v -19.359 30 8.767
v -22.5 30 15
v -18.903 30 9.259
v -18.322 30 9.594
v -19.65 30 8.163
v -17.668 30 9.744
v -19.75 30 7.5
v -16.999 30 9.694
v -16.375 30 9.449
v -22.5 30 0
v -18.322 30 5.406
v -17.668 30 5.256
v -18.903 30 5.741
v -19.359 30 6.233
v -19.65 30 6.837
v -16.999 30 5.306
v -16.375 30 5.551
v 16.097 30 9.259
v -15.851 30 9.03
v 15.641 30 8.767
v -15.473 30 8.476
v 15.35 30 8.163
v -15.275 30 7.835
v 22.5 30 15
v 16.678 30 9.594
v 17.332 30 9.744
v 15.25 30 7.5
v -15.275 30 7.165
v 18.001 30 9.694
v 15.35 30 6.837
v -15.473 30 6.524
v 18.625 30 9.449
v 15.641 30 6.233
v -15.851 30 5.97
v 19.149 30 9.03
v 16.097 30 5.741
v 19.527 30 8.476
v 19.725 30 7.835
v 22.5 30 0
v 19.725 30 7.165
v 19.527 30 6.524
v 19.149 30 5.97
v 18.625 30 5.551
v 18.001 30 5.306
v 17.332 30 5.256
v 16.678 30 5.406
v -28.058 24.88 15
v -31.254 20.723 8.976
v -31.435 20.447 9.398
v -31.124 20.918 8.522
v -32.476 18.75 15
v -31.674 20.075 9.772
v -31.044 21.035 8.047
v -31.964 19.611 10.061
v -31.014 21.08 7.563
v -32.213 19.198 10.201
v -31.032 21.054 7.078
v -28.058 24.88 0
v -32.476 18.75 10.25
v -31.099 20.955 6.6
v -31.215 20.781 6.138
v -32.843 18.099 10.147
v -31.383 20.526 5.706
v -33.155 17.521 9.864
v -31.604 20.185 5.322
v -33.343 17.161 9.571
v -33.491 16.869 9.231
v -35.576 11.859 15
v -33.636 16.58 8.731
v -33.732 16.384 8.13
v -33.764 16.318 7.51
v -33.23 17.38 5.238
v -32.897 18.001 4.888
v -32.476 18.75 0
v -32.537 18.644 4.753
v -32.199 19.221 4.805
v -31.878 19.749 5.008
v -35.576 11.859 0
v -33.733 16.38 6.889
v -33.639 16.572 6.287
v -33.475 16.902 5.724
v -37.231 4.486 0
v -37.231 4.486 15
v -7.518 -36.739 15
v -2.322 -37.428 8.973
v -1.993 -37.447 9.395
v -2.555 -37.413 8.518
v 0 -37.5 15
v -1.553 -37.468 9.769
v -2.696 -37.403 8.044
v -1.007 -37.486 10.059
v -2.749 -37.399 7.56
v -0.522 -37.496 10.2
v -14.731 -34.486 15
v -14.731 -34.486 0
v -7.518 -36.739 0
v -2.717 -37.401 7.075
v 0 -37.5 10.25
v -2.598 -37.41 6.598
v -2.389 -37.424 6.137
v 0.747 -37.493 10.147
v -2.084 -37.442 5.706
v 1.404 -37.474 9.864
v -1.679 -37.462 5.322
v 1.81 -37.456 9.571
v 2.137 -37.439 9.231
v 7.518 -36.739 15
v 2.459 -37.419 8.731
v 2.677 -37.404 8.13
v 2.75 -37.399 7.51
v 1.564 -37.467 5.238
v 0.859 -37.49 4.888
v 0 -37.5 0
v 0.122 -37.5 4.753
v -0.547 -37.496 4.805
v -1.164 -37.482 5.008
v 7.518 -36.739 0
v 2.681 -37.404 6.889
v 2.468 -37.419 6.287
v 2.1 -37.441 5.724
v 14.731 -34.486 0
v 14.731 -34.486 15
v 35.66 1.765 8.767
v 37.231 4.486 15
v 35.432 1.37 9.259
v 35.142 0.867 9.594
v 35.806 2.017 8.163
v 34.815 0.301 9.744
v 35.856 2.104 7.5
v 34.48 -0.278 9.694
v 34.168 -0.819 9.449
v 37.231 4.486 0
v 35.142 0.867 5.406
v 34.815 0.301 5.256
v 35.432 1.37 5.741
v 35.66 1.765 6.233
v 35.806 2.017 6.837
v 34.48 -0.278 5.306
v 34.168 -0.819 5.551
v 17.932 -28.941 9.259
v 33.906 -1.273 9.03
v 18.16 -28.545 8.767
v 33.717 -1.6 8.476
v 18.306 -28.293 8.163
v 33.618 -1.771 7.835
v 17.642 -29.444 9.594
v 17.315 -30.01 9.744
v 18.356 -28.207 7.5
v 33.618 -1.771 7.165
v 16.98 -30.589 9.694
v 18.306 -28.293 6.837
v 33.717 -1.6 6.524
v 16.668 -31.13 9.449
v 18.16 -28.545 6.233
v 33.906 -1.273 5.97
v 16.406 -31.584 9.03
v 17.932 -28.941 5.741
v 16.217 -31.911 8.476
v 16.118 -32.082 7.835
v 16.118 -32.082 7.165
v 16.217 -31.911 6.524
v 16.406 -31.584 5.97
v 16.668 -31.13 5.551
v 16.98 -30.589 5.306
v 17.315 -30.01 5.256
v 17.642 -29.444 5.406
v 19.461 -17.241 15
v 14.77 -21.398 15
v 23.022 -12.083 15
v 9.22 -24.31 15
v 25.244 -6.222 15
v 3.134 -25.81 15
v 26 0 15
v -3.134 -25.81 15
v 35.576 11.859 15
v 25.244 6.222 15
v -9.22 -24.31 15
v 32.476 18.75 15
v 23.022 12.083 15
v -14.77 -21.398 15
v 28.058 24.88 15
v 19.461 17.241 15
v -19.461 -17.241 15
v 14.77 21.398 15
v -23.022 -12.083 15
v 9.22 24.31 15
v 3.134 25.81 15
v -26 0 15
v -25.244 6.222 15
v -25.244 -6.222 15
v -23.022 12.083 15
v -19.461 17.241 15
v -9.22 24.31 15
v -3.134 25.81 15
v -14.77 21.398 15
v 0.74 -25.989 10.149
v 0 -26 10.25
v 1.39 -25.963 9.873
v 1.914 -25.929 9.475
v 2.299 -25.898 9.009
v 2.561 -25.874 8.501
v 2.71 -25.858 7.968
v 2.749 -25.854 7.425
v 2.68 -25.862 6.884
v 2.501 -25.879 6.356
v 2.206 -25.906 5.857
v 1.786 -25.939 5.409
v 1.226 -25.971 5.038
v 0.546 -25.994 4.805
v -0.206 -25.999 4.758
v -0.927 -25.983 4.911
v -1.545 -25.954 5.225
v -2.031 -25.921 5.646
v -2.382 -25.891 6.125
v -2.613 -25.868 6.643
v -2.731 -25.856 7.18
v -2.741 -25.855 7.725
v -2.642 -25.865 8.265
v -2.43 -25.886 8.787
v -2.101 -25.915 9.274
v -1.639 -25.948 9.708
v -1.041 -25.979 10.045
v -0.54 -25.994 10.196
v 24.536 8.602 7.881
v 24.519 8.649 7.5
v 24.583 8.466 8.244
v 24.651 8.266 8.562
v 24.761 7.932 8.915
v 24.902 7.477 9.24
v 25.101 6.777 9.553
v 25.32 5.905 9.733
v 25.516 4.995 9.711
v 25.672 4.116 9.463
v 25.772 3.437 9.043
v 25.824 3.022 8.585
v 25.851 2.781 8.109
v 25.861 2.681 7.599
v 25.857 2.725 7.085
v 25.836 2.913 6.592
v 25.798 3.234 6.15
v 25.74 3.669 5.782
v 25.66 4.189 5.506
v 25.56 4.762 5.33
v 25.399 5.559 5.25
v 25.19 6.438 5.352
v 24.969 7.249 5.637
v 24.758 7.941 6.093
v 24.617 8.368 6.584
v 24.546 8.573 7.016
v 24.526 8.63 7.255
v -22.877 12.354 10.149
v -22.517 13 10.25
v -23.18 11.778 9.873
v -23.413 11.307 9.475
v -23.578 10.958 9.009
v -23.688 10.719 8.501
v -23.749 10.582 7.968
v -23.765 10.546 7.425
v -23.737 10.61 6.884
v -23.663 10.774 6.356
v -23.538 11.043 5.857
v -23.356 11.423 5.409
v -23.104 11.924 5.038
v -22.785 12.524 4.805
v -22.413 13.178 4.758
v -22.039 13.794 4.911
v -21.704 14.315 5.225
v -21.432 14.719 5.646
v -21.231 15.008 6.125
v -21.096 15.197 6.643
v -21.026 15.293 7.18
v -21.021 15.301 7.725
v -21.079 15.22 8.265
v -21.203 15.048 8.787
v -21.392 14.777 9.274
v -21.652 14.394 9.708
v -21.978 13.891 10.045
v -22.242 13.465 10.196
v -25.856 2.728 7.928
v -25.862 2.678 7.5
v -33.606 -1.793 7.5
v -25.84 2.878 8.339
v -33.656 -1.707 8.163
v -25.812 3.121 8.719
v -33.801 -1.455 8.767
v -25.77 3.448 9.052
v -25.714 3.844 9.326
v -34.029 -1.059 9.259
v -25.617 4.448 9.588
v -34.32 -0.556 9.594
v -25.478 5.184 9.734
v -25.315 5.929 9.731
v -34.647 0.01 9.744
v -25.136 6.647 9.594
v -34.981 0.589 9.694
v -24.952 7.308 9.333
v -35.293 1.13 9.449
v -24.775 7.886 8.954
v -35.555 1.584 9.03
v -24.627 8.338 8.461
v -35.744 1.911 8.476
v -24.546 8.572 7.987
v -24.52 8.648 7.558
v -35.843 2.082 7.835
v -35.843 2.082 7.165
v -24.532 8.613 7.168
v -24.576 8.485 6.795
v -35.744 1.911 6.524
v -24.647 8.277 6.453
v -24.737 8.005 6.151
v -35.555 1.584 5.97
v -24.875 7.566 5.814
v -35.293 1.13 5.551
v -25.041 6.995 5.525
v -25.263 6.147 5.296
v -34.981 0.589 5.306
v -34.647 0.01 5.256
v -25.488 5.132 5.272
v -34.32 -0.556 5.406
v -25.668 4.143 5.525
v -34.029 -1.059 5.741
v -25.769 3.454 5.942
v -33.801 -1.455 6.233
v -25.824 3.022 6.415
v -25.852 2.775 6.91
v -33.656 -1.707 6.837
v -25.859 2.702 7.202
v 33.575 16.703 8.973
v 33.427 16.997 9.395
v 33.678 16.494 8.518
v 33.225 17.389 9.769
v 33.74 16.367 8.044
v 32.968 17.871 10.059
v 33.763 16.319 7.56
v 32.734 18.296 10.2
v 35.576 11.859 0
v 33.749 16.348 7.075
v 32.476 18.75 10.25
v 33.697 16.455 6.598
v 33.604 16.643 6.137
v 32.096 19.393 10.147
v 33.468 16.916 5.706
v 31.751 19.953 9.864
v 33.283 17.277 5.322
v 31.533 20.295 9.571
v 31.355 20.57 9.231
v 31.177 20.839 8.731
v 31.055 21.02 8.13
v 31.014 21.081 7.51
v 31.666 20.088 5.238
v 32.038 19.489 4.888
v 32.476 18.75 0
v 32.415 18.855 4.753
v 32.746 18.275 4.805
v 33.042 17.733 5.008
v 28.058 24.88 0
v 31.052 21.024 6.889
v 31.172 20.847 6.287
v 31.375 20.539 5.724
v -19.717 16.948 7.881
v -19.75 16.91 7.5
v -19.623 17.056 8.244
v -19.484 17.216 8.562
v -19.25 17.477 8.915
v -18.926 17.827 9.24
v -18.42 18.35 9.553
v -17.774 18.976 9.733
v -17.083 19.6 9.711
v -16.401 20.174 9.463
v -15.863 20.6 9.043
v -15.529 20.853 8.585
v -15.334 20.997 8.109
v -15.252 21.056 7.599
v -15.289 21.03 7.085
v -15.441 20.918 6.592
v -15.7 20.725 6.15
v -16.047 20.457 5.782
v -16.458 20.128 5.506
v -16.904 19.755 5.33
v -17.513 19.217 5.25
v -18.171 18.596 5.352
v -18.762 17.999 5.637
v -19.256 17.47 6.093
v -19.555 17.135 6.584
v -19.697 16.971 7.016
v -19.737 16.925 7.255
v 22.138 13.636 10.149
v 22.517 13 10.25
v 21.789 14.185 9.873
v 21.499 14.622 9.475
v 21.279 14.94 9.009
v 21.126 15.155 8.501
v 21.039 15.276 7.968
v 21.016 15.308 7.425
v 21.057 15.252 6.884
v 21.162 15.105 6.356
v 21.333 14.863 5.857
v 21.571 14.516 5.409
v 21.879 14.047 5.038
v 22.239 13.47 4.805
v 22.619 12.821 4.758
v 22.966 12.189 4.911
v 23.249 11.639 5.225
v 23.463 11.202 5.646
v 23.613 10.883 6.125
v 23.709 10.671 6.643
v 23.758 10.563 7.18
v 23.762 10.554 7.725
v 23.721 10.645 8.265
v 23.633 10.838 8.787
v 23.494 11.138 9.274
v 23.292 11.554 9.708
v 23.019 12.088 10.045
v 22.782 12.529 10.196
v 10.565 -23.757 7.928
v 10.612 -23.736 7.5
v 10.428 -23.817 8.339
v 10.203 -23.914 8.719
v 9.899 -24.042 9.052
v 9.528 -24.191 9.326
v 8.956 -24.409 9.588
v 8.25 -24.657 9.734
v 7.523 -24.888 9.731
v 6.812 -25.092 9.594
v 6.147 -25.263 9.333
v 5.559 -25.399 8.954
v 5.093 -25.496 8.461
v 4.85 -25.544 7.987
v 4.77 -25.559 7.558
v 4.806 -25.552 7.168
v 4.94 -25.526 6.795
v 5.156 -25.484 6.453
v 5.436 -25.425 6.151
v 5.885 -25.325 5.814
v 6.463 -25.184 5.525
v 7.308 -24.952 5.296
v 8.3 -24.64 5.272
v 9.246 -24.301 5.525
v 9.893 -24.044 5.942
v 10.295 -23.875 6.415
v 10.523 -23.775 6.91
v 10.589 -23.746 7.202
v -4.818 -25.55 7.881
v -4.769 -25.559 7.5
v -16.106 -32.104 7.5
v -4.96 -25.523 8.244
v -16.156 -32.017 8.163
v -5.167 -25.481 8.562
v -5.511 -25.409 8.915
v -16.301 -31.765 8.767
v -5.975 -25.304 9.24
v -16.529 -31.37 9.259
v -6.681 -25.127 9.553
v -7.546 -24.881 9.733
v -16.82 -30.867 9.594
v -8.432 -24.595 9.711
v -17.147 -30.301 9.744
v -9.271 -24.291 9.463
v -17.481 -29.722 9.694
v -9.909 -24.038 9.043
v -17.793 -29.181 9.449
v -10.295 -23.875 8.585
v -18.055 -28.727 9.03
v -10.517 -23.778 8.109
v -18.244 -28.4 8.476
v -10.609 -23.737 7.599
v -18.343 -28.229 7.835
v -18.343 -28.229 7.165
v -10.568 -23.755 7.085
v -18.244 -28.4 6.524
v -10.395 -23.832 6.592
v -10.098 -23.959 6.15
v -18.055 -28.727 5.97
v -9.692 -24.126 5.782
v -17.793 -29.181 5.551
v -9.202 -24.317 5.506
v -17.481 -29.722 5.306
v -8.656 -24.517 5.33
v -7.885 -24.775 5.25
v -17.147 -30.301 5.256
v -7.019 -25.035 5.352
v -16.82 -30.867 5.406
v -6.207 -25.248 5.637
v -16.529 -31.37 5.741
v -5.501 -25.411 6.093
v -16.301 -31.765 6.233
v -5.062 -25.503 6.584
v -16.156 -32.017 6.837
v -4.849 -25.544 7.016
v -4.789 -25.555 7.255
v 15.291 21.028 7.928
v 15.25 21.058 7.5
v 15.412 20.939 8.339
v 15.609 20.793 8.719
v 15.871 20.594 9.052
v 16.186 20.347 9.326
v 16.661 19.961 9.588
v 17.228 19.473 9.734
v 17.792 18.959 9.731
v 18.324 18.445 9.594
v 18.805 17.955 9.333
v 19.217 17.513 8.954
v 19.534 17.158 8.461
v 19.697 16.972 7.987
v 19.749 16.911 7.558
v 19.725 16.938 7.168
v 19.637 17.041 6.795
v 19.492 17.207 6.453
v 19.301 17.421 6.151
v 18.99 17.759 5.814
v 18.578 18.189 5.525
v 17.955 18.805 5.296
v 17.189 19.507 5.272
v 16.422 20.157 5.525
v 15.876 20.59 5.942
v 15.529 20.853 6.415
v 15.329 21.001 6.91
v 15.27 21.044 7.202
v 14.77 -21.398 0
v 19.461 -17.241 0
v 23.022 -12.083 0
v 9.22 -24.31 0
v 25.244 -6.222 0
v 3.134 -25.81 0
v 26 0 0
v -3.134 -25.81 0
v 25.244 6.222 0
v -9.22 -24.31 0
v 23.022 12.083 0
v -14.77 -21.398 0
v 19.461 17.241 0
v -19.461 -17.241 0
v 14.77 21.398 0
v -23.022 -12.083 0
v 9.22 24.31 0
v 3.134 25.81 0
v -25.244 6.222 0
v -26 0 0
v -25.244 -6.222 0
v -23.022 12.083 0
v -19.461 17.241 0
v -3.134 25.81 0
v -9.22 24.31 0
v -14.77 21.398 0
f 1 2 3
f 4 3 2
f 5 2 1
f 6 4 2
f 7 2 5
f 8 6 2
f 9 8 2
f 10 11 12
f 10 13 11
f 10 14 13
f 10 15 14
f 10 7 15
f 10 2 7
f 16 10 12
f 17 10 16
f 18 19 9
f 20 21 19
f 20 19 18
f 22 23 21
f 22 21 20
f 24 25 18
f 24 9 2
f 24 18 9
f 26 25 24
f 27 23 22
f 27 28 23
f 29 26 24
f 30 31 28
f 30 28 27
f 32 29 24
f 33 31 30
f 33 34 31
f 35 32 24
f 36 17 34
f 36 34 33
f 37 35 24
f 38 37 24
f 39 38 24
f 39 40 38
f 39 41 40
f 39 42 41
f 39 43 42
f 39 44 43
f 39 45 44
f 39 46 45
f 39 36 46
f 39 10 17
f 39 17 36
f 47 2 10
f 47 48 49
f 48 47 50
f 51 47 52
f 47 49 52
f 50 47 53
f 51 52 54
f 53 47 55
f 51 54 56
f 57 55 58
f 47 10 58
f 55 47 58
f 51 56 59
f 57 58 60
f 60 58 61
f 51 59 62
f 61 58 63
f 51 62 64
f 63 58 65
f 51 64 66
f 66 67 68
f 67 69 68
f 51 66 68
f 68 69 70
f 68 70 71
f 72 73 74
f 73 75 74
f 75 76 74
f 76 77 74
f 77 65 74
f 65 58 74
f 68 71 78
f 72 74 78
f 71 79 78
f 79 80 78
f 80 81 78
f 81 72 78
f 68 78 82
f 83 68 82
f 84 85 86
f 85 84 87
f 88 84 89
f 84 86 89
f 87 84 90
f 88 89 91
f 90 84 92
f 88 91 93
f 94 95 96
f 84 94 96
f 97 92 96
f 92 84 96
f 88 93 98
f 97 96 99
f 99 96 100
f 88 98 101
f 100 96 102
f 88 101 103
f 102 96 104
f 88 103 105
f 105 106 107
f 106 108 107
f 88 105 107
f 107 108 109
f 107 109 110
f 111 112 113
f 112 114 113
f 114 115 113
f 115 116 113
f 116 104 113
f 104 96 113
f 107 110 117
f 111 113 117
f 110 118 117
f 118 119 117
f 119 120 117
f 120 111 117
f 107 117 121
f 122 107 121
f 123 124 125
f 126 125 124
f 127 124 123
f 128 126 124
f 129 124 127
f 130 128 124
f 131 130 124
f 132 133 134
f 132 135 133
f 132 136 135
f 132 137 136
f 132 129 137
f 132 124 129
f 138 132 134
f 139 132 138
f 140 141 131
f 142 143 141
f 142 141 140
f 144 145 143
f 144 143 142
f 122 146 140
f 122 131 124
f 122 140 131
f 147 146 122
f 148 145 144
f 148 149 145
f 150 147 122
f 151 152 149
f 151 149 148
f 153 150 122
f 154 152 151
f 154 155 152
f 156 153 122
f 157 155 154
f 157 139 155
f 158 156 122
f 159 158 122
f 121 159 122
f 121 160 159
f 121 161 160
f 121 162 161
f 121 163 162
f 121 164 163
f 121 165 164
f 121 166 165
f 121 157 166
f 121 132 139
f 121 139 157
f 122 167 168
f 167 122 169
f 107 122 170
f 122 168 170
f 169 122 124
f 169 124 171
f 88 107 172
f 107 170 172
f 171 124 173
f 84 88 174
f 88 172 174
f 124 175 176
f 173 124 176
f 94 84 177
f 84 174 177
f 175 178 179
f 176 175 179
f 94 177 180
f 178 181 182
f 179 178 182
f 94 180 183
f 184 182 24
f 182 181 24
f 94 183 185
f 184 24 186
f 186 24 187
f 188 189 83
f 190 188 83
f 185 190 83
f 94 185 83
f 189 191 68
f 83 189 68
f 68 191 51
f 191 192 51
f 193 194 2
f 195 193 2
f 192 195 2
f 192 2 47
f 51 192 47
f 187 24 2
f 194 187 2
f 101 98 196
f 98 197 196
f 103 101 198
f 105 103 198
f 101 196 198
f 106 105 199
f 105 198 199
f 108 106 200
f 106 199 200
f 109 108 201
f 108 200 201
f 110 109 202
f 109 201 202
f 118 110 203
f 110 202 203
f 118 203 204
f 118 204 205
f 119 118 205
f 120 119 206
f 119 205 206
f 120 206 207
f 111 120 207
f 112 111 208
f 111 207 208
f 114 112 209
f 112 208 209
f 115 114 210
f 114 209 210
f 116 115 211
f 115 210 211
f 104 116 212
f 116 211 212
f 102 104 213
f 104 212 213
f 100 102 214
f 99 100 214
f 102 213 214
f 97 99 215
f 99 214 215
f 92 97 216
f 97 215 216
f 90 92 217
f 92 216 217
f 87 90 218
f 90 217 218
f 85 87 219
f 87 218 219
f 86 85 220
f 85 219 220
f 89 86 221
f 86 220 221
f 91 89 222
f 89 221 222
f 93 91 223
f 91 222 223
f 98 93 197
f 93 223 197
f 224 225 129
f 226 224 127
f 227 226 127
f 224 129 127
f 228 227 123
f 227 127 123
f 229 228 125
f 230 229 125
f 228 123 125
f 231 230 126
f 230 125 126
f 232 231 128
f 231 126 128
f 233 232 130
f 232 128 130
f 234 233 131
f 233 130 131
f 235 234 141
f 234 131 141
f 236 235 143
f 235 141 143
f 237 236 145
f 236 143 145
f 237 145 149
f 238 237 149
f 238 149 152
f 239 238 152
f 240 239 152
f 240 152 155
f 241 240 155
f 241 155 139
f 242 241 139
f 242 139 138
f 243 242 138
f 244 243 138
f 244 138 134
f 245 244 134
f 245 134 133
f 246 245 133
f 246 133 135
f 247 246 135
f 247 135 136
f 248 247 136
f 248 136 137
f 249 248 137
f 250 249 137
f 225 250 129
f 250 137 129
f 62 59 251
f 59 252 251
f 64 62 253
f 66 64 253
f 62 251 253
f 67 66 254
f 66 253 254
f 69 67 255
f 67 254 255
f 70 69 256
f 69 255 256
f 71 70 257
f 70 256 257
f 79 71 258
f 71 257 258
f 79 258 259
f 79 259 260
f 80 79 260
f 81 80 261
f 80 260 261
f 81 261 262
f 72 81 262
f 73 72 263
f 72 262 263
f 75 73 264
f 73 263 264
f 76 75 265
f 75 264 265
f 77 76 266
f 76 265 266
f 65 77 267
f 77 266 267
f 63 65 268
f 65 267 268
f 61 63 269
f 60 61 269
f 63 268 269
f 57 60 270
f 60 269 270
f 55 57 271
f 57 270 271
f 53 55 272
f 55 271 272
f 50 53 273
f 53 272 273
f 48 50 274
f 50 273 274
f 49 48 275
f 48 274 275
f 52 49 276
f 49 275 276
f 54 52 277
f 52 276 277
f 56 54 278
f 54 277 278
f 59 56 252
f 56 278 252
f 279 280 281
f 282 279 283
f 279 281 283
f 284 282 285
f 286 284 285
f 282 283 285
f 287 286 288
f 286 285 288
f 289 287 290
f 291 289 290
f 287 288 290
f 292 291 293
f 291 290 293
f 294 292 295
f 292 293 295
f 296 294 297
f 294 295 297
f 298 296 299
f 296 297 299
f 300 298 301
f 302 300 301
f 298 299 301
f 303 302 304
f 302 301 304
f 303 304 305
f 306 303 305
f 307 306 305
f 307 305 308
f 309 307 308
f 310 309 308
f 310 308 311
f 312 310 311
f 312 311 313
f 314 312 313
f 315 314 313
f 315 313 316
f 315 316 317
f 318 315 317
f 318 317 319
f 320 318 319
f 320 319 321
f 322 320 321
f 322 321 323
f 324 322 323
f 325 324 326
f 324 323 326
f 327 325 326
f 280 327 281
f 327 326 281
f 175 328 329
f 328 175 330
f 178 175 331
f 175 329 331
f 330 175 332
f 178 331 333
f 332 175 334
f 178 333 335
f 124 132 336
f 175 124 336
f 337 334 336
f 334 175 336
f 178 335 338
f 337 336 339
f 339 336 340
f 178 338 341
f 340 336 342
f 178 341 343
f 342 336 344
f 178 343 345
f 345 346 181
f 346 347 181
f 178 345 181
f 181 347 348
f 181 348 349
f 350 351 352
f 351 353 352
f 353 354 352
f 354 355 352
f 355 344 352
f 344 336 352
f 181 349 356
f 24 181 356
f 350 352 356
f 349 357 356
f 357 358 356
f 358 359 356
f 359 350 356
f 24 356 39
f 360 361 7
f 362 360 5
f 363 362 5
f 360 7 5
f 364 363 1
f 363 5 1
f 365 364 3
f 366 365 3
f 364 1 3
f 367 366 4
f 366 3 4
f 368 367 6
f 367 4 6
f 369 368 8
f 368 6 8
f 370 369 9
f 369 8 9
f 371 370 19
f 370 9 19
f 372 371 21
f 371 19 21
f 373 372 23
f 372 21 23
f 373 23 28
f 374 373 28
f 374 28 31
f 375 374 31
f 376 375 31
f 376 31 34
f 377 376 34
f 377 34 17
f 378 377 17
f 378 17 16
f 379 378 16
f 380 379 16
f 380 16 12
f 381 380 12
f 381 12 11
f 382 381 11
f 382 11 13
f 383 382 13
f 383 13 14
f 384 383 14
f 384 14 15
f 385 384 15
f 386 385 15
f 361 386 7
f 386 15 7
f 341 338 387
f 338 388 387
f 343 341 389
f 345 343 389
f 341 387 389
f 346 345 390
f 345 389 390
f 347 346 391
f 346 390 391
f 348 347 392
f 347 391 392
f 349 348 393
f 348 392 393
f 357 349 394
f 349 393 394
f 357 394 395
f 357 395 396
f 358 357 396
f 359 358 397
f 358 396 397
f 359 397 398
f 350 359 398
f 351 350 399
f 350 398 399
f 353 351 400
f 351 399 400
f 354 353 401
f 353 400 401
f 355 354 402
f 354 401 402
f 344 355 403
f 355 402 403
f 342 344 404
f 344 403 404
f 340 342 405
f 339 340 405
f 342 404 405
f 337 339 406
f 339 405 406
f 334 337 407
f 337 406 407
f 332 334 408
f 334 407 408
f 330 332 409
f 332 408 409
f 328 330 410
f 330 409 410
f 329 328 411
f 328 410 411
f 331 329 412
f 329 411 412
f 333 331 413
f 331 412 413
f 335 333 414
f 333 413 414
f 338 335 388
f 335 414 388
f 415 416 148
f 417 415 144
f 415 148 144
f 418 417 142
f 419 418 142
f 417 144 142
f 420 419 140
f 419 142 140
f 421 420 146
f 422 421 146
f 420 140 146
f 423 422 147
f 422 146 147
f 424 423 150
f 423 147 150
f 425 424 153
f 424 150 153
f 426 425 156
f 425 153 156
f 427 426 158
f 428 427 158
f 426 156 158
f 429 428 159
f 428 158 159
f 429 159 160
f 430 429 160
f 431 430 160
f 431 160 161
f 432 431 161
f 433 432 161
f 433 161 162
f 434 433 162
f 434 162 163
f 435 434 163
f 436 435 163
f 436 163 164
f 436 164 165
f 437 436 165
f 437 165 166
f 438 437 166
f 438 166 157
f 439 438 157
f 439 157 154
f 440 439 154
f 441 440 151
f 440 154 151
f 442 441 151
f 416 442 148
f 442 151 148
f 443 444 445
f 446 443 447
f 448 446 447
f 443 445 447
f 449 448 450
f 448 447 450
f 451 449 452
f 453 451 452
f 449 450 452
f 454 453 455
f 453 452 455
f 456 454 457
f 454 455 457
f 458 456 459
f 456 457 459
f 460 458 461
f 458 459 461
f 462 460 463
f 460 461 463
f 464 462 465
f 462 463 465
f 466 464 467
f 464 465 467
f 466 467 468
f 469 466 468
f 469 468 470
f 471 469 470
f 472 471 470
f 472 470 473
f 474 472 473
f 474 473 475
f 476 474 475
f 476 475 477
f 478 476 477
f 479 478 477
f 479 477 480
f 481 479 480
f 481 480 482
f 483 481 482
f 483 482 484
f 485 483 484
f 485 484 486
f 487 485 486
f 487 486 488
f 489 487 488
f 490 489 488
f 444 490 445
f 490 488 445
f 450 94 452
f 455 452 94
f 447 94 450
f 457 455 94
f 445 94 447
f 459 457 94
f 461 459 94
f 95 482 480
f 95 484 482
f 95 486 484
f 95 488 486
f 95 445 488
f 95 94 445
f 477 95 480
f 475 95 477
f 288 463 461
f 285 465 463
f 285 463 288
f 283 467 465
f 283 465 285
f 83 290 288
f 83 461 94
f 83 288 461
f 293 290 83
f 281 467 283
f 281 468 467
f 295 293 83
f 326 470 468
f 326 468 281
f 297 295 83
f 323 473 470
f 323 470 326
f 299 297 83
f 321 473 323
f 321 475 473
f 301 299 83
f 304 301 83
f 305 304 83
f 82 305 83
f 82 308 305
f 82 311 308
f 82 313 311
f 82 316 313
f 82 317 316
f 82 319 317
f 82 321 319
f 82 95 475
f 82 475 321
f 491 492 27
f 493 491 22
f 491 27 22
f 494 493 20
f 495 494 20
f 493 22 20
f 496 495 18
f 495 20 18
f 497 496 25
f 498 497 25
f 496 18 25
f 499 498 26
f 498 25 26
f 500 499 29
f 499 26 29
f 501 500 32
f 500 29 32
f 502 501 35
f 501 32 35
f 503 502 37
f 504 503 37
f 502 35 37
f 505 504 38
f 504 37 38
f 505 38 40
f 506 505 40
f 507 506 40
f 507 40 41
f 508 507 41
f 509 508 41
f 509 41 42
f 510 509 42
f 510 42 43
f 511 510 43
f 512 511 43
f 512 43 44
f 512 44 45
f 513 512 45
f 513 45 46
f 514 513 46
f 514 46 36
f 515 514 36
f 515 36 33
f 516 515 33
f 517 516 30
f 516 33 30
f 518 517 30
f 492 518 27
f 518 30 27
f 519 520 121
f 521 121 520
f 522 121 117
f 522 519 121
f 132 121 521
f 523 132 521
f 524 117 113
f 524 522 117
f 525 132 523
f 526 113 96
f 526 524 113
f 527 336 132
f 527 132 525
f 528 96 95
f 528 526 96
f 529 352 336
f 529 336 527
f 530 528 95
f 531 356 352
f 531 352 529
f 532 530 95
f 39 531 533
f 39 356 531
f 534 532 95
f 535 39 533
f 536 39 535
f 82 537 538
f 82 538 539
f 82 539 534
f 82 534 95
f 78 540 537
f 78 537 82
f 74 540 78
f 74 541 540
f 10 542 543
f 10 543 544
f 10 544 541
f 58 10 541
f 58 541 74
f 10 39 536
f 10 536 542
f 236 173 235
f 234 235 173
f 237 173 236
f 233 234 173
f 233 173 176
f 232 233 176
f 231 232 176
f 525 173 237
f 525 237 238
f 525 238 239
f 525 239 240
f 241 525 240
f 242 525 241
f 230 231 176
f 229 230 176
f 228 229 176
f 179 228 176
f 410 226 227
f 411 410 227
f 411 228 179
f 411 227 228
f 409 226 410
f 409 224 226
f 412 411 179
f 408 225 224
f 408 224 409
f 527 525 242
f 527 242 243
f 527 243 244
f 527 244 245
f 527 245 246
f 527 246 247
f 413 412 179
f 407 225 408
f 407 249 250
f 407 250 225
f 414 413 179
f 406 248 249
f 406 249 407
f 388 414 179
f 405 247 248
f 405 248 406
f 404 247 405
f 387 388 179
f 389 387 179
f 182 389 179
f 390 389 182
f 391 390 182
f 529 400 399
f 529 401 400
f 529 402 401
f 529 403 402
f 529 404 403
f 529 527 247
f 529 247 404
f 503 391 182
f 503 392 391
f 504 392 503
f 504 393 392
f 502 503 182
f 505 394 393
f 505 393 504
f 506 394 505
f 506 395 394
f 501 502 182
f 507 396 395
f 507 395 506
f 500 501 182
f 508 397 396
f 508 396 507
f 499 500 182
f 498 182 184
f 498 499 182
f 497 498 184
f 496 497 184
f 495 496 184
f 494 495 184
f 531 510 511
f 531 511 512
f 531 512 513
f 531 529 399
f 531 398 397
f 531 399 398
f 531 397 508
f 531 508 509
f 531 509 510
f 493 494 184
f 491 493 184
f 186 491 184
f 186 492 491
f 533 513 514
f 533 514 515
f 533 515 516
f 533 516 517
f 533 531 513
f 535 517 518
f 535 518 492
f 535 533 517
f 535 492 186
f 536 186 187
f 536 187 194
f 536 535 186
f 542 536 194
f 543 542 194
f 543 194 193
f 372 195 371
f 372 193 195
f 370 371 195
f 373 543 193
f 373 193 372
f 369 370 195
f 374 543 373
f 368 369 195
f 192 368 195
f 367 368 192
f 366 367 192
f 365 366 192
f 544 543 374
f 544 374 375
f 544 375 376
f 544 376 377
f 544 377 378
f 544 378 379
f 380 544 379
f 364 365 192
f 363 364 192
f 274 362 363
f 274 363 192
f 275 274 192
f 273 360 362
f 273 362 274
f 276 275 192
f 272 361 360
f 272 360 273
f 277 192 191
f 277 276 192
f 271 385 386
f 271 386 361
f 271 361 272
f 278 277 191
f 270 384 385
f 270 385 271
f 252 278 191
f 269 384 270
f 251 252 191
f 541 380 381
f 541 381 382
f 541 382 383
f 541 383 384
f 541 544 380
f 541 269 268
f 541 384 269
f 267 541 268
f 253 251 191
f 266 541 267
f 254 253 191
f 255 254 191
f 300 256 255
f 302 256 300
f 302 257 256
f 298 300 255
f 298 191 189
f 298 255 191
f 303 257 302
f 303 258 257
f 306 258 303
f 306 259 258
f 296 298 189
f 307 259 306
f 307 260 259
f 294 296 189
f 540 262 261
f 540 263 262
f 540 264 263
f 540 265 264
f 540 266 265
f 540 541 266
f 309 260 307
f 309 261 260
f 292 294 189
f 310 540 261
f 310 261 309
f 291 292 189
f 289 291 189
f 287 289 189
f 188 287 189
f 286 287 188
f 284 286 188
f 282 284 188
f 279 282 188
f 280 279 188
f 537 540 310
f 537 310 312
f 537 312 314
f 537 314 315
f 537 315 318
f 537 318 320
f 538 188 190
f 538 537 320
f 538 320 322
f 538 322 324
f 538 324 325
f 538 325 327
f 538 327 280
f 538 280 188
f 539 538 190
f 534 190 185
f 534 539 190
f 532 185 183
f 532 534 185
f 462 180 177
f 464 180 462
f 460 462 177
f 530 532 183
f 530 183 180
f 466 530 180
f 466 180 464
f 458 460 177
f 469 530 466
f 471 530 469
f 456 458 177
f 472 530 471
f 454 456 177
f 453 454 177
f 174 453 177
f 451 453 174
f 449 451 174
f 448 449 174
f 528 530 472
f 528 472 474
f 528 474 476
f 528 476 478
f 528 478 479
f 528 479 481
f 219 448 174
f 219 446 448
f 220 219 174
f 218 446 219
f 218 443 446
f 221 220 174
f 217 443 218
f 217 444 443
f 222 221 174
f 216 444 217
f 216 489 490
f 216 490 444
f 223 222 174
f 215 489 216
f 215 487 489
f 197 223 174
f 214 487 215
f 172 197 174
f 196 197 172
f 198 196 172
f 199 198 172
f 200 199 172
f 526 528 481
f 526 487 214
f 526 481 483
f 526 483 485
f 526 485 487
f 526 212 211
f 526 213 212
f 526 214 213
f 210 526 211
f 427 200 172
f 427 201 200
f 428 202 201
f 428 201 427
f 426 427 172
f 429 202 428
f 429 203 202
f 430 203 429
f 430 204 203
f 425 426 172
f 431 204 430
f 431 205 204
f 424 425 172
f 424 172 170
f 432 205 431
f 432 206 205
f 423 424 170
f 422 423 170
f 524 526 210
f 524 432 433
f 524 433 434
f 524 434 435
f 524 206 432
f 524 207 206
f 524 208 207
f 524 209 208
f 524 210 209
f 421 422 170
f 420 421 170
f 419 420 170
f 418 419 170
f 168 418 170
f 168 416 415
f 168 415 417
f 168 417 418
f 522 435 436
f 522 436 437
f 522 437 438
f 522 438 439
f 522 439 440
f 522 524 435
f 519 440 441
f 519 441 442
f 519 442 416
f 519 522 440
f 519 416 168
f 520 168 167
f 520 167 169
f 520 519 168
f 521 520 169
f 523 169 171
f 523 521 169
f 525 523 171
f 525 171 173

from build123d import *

# Parameters (mm, degrees)
SKETCH_R              = 26
PAD_DEPTH             = 15
SKETCH001_R           = 2.25
POCKET_DEPTH          = 16
POLARPATTERN_COUNT    = 3
SKETCH002_R           = 2.75
POCKET001_DEPTH       = 15
POLARPATTERN001_COUNT = 3


with BuildPart() as part:
    # Sketch → Pad (new body)
    with BuildSketch(Plane.XY):
        with BuildLine():
            Line((-22.5, 30), (22.5, 30))
            ThreePointArc((37.2307621135, 4.4855715852), (32.4759535891, 18.7500005468), (22.5, 30))
            Line((37.2307621135, 4.4855715852), (14.7307621135, -34.4855715852))
            ThreePointArc((-14.7307621135, -34.4855715852), (0, -37.5000010954), (14.7307621135, -34.4855715852))
            Line((-14.7307621135, -34.4855715852), (-37.2307621135, 4.4855715851))
            ThreePointArc((-22.5, 30), (-32.475953589, 18.7500005468), (-37.2307621135, 4.4855715852))
        make_face()
        Circle(SKETCH_R, mode=Mode.SUBTRACT)
    extrude(amount=PAD_DEPTH)

    # Sketch001 (on DatumPlane) → Pocket (cut)
    with BuildSketch(Plane(origin=(25.9807621135, -15, 0), x_dir=(0.5, 0.8660254038, 0), z_dir=(0.8660254038, -0.5, 0))):
        with Locations((-17.5, 7.5)):
            Circle(SKETCH001_R)
        with Locations((17.5, 7.5)):
            Circle(SKETCH001_R)
    pocket = extrude(amount=-POCKET_DEPTH, mode=Mode.SUBTRACT)

    # PolarPattern: Pocket ×3 about axis
    polarpattern_axis = Axis((0, 0, 0), (0, 0, 1))
    for i in range(1, POLARPATTERN_COUNT):
        add(pocket.rotate(polarpattern_axis, i * 360 / POLARPATTERN_COUNT), mode=Mode.SUBTRACT)

    # Sketch002 (on DatumPlane) → Pocket001 (cut, symmetric)
    with BuildSketch(Plane(origin=(-31.6010078868, 18.2448504101, 7.5), x_dir=(0, 0, 1), z_dir=(0.8660254038, -0.5, 0))):
        Circle(SKETCH002_R)
    pocket001 = extrude(amount=POCKET001_DEPTH, both=True, mode=Mode.SUBTRACT)

    # PolarPattern001: Pocket001 ×3 about axis
    polarpattern001_axis = Axis((0, 0, 0), (0, 0, 1))
    for i in range(1, POLARPATTERN001_COUNT):
        add(pocket001.rotate(polarpattern001_axis, i * 360 / POLARPATTERN001_COUNT), mode=Mode.SUBTRACT)


solid = part.part
